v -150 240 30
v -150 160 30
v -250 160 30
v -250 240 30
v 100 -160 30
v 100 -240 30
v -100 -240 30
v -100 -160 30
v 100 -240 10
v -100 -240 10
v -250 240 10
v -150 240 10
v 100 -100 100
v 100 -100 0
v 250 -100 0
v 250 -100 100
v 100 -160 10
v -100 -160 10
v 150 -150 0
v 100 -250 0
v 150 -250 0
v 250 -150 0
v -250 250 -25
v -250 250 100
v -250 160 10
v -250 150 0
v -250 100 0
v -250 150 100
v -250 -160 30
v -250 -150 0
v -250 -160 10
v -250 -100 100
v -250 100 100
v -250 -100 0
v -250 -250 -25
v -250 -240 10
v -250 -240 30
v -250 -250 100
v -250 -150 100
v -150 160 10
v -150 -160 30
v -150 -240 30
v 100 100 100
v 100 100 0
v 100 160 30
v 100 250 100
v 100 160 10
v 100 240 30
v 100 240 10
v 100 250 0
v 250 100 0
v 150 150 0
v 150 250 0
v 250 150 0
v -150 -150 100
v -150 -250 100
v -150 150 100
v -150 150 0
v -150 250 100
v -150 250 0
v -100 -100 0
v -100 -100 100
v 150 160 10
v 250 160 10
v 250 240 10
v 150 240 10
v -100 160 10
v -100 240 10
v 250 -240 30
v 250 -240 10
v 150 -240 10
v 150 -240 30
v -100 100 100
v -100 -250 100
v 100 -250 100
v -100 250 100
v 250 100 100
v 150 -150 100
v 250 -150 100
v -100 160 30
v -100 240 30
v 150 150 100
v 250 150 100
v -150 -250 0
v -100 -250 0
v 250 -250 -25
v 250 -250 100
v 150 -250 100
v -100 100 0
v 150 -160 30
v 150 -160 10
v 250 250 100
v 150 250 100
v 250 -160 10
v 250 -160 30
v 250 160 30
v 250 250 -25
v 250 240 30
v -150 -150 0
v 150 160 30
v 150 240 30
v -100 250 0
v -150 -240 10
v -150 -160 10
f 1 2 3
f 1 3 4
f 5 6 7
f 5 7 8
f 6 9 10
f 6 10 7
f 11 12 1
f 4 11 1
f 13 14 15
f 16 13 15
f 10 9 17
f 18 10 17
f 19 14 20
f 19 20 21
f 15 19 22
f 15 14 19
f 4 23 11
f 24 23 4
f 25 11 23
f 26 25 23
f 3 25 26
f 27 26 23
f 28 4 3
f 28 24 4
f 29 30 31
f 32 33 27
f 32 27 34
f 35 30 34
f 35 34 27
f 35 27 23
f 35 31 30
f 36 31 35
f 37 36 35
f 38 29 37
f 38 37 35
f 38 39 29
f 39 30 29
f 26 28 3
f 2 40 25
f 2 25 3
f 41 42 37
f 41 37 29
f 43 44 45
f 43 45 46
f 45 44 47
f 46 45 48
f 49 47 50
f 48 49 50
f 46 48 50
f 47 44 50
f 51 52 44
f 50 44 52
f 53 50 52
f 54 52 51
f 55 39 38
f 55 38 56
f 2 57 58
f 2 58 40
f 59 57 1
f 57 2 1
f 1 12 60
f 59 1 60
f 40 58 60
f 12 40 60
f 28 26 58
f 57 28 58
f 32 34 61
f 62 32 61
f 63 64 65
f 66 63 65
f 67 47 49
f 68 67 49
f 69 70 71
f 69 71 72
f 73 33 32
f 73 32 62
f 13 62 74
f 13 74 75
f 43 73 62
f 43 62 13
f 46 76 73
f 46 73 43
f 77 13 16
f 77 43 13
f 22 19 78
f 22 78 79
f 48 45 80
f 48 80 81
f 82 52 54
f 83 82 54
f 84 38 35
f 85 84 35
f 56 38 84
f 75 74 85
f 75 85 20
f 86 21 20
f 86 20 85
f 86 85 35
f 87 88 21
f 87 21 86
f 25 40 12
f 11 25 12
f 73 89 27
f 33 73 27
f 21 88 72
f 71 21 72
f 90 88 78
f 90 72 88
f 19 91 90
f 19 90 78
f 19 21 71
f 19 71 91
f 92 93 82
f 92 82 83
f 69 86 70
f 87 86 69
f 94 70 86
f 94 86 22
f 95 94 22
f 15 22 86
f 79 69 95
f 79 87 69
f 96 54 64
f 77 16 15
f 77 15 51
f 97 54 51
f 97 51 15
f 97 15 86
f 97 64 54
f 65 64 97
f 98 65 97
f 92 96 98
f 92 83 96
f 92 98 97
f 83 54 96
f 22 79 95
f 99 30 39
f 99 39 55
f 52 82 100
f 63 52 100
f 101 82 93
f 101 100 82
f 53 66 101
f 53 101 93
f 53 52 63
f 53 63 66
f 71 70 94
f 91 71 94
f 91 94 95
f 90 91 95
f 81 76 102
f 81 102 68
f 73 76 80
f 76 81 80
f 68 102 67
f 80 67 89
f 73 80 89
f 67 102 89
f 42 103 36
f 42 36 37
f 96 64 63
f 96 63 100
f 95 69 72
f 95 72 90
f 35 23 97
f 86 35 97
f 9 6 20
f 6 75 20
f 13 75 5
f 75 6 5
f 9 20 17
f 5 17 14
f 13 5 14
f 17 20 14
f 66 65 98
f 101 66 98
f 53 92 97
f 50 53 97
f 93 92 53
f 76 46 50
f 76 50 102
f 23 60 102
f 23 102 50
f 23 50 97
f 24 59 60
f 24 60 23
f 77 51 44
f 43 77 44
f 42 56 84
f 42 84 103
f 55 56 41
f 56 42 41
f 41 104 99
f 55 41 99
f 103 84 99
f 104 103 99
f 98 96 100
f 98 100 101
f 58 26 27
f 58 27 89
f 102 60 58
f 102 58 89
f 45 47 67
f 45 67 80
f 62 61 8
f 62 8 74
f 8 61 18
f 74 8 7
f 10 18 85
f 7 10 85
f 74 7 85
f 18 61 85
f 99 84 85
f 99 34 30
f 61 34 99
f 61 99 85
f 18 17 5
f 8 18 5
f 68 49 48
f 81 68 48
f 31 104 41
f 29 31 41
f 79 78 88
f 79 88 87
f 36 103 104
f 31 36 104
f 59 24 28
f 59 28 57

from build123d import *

# Parameters (mm, degrees)
F0_W     = 100
F0_H     = 100
F1_DEPTH = 100
F2_DEPTH = 25
F3_W     = 80
F3_H     = 20
F4_DEPTH = 5000


with BuildPart() as f1:
    # F0 (on Top) → F1 (new body)
    with BuildSketch(Plane.XY):
        Polygon((100, 100), (100, 250), (-100, 250), (-100, 100), (-250, 100), (-250, -100), (-100, -100), (-100, -250), (100, -250), (100, -100), (250, -100), (250, 100), align=None)
        with Locations((-200, -200)):
            Rectangle(F0_W, F0_H)
        with Locations((200, -200)):
            Rectangle(F0_W, F0_H)
        with Locations((200, 200)):
            Rectangle(F0_W, F0_H)
        with Locations((-200, 200)):
            Rectangle(F0_W, F0_H)
    extrude(amount=F1_DEPTH)

    # F0 (on Top) → F2 (join)
    with BuildSketch(Plane.XY):
        with Locations((200, -200)):
            Rectangle(F0_W, F0_H)
        Polygon((250, -150), (250, -100), (100, -100), (100, -250), (150, -250), (150, -150), align=None)
        Polygon((150, 150), (150, 250), (100, 250), (100, 100), (250, 100), (250, 150), align=None)
        with Locations((200, 200)):
            Rectangle(F0_W, F0_H)
        Polygon((100, 100), (100, 250), (-100, 250), (-100, 100), (-250, 100), (-250, -100), (-100, -100), (-100, -250), (100, -250), (100, -100), (250, -100), (250, 100), align=None)
        Polygon((-100, -100), (-250, -100), (-250, -150), (-150, -150), (-150, -250), (-100, -250), align=None)
        with Locations((-200, -200)):
            Rectangle(F0_W, F0_H)
        Polygon((-100, 100), (-100, 250), (-150, 250), (-150, 150), (-250, 150), (-250, 100), align=None)
        with Locations((-200, 200)):
            Rectangle(F0_W, F0_H)
    extrude(amount=-F2_DEPTH)

    # F3 (on face) → F4 (cut)
    with BuildSketch(Plane.YZ.offset(250)):
        with Locations((-200, 20)):
            Rectangle(F3_W, F3_H)
        with Locations((200, 20)):
            Rectangle(F3_W, F3_H)
    extrude(amount=-F4_DEPTH, mode=Mode.SUBTRACT)


solid = f1.part
